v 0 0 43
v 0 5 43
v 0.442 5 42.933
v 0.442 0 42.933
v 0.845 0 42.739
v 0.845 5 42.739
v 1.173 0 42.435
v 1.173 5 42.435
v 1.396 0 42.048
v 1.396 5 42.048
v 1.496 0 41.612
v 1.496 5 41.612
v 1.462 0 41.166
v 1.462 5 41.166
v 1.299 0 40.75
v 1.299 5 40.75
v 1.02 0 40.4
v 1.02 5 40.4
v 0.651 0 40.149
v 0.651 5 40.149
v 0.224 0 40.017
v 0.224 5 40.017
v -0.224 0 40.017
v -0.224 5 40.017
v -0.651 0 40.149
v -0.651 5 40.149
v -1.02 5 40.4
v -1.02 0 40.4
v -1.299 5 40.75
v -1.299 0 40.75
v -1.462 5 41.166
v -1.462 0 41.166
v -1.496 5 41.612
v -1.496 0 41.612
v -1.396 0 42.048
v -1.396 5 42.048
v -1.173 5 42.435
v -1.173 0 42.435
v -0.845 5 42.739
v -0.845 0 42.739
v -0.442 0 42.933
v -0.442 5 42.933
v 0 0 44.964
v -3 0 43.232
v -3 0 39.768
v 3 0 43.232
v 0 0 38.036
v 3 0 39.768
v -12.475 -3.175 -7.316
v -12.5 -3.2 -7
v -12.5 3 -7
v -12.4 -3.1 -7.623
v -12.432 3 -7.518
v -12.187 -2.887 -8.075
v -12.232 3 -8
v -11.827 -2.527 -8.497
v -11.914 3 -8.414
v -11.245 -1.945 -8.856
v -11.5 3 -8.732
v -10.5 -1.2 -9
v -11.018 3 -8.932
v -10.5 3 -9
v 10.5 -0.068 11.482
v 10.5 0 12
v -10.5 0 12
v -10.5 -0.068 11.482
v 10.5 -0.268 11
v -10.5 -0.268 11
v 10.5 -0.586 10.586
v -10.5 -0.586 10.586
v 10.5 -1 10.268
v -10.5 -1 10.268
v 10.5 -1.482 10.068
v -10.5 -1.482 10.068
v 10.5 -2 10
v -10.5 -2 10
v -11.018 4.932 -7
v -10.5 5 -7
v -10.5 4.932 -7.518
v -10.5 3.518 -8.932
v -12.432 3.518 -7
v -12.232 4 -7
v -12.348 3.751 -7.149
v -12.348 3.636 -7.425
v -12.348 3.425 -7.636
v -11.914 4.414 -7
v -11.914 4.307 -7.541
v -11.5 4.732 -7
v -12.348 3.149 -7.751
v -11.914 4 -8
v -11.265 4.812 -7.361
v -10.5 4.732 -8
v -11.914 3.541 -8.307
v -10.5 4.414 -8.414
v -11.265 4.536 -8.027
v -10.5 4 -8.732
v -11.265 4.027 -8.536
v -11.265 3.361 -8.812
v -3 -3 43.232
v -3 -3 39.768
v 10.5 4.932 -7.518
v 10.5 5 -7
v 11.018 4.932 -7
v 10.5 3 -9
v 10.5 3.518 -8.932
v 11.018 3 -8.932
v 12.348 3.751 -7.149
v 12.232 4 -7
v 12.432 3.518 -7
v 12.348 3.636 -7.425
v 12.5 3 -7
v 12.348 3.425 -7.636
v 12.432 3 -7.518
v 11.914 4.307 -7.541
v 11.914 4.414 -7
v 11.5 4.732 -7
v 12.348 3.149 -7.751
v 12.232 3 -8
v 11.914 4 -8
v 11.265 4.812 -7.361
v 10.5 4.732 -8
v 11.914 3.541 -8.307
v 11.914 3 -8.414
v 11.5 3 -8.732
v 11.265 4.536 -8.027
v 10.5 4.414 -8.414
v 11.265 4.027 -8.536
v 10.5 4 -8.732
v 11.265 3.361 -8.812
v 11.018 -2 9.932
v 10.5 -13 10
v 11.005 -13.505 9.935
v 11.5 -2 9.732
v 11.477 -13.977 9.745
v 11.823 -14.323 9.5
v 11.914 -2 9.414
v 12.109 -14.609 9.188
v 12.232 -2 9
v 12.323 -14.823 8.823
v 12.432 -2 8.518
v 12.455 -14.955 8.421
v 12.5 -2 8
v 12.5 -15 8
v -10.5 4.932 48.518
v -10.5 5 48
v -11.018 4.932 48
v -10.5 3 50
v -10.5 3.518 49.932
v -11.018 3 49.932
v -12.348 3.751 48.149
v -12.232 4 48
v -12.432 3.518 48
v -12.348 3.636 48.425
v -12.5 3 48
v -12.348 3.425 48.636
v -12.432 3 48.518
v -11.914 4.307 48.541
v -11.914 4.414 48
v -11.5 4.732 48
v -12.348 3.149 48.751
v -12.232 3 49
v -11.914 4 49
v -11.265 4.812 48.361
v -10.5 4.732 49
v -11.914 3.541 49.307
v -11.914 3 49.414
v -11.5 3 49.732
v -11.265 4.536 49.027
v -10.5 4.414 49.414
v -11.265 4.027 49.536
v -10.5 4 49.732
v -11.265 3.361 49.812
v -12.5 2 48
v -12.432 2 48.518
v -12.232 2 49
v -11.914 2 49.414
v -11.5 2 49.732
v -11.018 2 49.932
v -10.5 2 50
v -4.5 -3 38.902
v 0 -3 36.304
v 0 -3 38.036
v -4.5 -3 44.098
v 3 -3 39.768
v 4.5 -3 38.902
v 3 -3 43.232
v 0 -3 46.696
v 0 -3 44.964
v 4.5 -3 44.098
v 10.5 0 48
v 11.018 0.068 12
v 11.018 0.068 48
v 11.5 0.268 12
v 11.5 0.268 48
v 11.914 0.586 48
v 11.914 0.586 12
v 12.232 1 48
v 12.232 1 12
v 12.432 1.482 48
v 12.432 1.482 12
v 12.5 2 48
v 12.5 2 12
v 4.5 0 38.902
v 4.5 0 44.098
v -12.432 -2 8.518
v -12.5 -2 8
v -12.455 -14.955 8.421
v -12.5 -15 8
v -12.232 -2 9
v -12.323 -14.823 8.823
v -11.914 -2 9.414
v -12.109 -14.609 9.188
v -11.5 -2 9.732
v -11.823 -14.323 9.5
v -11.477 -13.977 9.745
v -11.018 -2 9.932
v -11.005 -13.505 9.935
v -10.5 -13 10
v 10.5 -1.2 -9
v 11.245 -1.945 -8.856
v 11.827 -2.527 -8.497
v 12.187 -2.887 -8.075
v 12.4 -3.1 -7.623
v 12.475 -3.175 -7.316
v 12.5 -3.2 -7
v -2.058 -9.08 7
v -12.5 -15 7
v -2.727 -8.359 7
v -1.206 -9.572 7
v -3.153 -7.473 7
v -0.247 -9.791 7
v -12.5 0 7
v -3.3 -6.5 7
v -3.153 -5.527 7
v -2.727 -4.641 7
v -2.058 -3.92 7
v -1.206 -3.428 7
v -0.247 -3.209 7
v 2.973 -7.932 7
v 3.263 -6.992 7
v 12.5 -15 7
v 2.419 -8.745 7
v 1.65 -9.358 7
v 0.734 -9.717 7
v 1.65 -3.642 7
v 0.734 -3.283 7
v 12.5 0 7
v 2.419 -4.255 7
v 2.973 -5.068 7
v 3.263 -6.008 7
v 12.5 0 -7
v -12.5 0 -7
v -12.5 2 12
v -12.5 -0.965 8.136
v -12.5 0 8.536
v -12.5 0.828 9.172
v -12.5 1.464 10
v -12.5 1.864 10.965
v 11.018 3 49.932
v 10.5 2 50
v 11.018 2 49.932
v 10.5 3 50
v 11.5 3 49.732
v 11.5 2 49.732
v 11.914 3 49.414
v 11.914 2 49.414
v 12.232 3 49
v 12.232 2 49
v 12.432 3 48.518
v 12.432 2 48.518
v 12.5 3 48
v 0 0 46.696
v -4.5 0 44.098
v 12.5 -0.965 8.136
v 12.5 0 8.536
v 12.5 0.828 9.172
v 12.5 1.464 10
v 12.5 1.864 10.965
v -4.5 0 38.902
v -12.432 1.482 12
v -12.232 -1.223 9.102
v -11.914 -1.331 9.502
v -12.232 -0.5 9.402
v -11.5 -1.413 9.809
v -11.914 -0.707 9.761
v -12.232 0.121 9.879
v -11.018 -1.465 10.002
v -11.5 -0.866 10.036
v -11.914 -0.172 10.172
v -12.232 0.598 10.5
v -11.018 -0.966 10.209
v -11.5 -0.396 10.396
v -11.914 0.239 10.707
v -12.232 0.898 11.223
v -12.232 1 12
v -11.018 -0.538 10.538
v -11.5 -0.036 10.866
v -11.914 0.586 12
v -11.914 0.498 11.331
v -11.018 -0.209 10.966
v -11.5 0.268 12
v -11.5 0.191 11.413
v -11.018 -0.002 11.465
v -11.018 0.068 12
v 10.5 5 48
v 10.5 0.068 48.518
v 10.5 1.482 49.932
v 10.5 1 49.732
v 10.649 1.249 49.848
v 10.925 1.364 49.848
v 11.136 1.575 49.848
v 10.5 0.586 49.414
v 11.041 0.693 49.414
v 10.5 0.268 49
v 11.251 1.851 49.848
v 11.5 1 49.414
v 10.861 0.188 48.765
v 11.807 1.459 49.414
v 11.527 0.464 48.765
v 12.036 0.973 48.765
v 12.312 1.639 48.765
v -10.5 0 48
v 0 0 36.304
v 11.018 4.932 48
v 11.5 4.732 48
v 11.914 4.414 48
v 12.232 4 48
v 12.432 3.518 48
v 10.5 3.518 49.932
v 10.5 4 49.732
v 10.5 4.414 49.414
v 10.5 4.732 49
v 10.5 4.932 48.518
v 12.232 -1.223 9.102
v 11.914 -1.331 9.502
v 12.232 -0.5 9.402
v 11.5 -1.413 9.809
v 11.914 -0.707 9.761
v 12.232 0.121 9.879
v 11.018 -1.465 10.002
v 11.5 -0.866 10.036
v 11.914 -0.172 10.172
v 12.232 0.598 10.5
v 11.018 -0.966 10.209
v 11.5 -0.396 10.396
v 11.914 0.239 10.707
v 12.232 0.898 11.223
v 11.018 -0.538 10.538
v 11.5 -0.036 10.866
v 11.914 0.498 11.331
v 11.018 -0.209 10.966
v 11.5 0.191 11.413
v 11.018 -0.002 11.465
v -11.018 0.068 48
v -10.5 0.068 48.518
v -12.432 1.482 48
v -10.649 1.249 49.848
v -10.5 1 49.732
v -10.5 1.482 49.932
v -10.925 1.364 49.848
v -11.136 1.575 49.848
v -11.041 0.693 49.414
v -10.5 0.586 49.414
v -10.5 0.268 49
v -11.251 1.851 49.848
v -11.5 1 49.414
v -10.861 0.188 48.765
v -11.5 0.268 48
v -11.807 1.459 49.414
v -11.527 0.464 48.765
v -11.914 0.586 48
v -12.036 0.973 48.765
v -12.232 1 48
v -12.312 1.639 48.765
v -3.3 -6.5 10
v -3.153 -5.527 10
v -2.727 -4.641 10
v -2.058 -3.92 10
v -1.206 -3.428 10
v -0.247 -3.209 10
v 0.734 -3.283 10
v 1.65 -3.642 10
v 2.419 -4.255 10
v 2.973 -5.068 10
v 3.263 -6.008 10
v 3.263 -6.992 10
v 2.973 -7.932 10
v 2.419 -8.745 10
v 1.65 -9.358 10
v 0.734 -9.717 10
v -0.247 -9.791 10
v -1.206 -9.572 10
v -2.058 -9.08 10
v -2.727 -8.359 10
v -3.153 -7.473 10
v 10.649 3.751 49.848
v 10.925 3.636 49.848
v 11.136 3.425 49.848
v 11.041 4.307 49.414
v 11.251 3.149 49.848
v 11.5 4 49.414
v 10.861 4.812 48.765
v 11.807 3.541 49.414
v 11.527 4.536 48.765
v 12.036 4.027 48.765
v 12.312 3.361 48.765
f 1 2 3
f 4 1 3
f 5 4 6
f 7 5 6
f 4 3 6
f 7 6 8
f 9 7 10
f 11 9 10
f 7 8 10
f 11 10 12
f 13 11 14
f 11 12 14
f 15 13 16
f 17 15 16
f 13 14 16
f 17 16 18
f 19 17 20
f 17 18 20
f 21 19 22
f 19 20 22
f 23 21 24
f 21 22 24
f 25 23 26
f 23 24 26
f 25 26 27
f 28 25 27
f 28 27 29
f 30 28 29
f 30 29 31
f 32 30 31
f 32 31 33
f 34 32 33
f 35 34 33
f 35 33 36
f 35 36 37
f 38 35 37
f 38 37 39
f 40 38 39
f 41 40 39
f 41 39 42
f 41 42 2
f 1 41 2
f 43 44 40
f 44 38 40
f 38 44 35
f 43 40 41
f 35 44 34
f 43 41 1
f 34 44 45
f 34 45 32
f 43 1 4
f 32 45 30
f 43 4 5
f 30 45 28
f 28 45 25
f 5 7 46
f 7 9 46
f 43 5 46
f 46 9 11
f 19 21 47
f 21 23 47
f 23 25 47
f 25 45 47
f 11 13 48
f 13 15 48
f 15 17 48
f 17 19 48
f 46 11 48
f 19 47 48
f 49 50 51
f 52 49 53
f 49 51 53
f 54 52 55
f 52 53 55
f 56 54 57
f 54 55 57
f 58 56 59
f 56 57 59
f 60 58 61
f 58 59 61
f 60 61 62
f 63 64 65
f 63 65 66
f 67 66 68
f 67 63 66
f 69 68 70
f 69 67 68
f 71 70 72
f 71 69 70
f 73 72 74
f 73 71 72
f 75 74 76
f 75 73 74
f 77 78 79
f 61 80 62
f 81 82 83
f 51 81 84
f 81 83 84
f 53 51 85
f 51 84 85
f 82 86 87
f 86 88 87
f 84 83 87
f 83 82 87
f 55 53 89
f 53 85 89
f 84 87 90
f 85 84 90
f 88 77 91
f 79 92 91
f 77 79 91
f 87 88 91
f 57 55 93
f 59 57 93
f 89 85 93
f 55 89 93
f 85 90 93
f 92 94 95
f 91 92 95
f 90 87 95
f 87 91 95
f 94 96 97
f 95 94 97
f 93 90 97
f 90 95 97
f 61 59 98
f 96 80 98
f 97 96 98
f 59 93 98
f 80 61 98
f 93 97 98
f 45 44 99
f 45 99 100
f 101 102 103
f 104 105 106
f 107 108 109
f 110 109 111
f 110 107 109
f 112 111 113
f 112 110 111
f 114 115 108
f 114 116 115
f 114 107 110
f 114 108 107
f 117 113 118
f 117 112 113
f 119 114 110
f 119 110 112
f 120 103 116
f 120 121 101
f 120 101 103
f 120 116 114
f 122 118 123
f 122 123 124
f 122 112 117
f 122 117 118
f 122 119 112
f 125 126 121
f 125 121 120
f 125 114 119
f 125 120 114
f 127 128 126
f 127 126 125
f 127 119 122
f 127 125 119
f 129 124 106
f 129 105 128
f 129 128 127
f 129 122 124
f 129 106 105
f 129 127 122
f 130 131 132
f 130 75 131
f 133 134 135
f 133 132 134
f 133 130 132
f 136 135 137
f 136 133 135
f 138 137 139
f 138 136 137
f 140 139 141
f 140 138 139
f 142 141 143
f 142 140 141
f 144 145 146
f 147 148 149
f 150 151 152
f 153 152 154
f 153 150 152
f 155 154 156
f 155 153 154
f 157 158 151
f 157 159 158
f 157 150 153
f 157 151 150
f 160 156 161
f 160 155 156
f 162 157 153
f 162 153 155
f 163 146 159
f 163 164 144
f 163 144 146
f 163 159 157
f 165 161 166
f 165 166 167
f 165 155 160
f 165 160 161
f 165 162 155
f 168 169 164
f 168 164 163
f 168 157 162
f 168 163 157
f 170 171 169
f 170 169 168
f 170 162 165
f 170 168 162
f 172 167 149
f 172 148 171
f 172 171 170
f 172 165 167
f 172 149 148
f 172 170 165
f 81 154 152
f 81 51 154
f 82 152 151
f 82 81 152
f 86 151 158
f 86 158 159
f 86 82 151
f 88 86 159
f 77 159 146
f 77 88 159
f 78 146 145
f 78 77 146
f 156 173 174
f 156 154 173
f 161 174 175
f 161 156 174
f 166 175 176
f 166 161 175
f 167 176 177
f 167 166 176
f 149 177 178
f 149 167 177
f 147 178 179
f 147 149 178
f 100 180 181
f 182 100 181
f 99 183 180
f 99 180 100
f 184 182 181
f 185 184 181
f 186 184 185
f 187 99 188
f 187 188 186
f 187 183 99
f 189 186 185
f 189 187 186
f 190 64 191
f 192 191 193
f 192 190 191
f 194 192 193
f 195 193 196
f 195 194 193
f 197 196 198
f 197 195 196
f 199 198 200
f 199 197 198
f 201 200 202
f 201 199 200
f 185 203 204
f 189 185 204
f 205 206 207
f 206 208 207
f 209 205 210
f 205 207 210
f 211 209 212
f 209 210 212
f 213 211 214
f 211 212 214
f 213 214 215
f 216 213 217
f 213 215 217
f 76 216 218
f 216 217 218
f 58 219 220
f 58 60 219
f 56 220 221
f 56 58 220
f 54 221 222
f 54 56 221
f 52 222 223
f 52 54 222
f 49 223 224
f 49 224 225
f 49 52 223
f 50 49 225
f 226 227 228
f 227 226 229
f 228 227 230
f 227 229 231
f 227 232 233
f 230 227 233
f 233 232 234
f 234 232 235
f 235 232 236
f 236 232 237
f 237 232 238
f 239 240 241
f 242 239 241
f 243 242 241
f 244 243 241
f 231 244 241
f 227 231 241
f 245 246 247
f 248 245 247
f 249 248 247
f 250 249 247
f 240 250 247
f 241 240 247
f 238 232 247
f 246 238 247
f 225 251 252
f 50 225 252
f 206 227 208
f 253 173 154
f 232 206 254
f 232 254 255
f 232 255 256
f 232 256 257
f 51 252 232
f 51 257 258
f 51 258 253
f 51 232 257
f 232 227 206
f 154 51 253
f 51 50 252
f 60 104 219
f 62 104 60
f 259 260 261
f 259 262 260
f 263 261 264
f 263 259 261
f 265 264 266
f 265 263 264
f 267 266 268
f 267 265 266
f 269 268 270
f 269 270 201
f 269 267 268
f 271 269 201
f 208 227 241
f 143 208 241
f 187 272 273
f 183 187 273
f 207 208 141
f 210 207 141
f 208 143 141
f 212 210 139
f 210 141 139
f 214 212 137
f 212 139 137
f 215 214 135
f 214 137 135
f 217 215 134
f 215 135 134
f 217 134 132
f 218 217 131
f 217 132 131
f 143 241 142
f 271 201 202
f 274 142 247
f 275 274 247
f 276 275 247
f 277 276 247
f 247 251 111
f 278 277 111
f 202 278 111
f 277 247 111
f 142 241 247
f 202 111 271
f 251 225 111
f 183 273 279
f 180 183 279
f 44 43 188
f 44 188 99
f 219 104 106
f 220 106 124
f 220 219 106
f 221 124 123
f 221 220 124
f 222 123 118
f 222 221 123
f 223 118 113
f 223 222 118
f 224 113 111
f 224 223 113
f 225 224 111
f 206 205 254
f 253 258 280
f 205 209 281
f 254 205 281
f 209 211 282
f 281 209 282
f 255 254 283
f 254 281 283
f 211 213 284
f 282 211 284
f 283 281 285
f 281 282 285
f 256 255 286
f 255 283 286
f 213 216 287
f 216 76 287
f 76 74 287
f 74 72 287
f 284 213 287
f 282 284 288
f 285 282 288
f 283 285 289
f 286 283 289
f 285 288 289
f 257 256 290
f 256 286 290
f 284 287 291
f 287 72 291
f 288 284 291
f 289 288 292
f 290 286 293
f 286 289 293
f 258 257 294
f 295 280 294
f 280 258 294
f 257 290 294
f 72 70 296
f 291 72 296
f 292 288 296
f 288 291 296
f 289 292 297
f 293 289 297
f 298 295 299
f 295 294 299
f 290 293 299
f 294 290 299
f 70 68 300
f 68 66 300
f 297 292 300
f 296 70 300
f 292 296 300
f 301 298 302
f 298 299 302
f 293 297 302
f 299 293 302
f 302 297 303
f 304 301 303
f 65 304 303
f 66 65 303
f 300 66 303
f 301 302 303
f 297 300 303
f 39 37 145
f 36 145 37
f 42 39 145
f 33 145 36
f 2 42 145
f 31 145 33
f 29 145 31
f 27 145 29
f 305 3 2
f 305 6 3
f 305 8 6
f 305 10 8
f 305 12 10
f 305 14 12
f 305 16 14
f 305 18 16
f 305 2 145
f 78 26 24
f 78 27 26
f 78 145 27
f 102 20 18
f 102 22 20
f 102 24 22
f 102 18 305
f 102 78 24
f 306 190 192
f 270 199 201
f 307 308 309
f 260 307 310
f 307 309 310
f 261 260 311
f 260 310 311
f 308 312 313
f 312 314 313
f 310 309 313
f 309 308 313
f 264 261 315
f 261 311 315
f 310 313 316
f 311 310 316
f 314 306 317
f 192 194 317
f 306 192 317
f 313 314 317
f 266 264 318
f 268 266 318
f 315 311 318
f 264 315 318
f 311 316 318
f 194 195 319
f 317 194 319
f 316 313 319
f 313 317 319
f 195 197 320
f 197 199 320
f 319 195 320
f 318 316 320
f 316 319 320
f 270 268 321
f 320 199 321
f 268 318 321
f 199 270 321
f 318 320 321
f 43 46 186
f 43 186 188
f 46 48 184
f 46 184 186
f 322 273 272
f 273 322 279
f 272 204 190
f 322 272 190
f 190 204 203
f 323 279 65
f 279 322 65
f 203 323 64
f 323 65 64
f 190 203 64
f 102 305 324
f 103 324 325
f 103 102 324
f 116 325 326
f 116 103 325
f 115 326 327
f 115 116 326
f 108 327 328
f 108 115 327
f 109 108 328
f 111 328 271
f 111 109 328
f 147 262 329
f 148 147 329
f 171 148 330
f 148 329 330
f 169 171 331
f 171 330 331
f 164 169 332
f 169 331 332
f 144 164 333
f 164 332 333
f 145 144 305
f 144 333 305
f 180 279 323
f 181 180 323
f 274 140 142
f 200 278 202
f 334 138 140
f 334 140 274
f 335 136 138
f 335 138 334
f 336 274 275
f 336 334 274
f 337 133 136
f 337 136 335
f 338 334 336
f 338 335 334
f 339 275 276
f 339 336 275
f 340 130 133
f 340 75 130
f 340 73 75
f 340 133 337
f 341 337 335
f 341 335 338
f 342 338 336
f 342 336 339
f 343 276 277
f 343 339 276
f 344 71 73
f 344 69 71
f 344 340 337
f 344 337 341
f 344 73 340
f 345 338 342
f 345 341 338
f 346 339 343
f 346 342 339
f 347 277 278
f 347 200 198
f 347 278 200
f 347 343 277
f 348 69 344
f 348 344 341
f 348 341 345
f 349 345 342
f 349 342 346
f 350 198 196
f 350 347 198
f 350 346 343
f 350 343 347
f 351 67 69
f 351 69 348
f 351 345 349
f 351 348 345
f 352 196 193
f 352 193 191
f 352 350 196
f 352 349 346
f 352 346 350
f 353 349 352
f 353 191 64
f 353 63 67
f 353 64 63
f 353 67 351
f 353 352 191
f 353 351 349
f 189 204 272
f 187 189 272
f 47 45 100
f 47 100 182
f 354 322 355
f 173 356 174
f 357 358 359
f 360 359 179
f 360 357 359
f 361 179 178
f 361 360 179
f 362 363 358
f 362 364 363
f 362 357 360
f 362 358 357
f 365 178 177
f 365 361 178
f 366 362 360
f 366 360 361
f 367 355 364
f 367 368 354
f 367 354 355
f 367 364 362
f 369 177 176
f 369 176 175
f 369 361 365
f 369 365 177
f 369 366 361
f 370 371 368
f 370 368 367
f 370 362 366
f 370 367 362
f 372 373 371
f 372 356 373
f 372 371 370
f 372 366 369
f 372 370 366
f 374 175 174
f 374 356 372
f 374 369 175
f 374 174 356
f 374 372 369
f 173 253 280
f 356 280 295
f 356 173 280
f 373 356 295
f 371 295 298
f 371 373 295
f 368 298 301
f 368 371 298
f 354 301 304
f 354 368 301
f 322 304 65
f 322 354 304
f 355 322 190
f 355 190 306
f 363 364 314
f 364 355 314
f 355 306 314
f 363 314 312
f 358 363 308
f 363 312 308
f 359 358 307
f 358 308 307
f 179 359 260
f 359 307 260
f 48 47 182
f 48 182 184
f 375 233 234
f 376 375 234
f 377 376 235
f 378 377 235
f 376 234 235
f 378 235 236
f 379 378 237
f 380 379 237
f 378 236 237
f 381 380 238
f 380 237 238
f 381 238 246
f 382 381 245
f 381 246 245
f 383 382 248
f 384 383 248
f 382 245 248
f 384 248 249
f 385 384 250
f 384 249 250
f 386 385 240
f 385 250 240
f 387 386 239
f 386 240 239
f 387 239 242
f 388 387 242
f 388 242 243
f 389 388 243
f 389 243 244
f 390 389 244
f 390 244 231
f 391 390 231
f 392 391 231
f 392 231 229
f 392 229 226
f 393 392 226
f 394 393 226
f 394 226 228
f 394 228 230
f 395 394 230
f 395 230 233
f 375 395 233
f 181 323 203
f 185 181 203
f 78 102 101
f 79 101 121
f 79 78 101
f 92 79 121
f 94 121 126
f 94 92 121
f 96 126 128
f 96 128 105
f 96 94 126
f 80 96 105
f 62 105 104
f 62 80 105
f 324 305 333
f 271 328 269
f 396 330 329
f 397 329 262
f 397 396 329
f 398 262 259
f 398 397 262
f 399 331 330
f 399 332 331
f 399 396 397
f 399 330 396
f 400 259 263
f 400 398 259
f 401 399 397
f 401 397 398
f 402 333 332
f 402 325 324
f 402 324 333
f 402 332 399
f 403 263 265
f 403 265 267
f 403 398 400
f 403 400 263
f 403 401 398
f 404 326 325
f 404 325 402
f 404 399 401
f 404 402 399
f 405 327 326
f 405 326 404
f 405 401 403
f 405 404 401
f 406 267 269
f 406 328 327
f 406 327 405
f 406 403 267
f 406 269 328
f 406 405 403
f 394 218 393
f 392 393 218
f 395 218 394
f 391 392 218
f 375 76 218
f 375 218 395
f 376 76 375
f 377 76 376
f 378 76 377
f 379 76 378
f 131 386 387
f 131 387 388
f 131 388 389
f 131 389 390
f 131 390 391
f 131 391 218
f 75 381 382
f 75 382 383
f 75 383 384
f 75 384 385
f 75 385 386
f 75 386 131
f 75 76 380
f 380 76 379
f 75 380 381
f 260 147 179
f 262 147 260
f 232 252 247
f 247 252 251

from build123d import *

# Parameters (mm, degrees)
SKETCH1_W            = 25
SKETCH1_H            = 14
BOSS_EXTRUDE1_DEPTH  = 5
SKETCH2_W            = 25
SKETCH2_H            = 5
SKETCH2_H_2          = 15
BOSS_EXTRUDE2_DEPTH  = 3
M6_CLEARANCE_HOLE1_D = 6.6
SKETCH10_W           = 25
SKETCH10_H           = 5
BOSS_EXTRUDE5_DEPTH  = 2
SKETCH5_W            = 25
SKETCH5_H            = 5
BOSS_EXTRUDE4_DEPTH  = 40
CUT_EXTRUDE1_REACH   = 57.283
SKETCH9_R            = 1.5
FILLET1_R            = 2
BOSS_EXTRUDE6_DEPTH  = 3


with BuildPart() as part:
    # Sketch1 → Boss-Extrude1 (new body)
    with BuildSketch(Plane(origin=(0, 0, 0), x_dir=(1, 0, 0), z_dir=(0, 1, 0))):
        Rectangle(SKETCH1_W, SKETCH1_H)
    extrude(amount=BOSS_EXTRUDE1_DEPTH)

    # Sketch2 → Boss-Extrude2 (add)
    with BuildSketch(Plane.XY.offset(7)):
        with Locations((0, 2.5)):
            Rectangle(SKETCH2_W, SKETCH2_H)
        with Locations((0, -7.5)):
            Rectangle(SKETCH2_W, SKETCH2_H_2)
    extrude(amount=BOSS_EXTRUDE2_DEPTH)

    # M6 Clearance Hole1 (through all)
    with Locations(Plane.XY.offset(10)):
        with Locations((0, -6.5)):
            Hole(M6_CLEARANCE_HOLE1_D / 2)

    # Sketch10 → Boss-Extrude5 (add)
    with BuildSketch(Plane(origin=(0, 0, -7), x_dir=(-1, 0, 0), z_dir=(0, 0, -1))):
        Polygon((-12.5, 0), (-12.5, -3.2), (1e-09, -3.2), (12.5, -3.2), (12.5, 0), align=None)
        with Locations((0, 2.5)):
            Rectangle(SKETCH10_W, SKETCH10_H)
    extrude(amount=BOSS_EXTRUDE5_DEPTH)

    # Sketch5 → Boss-Extrude4 (add)
    with BuildSketch(Plane.XY.offset(10)):
        with Locations((0, 2.5)):
            Rectangle(SKETCH5_W, SKETCH5_H)
    extrude(amount=BOSS_EXTRUDE4_DEPTH)

    # Sketch9 → Cut-Extrude1 (cut, up to next)
    with BuildSketch(Plane(origin=(0, 5, 0), x_dir=(1, 0, 0), z_dir=(0, 1, 0)), mode=Mode.PRIVATE) as cut_extrude1_sk1:
        with Locations(Location((0, -41.5, 0), (0, 0, 270))):
            Circle(SKETCH9_R)
    cut_extrude1_tool1 = extrude(cut_extrude1_sk1.sketch, amount=-CUT_EXTRUDE1_REACH, mode=Mode.PRIVATE) & part.part
    add(cut_extrude1_tool1.solids().sort_by_distance((0, 5, 41.5))[0], mode=Mode.SUBTRACT)

    # Fillet1
    fillet1_edges = [part.edges().sort_by_distance(p)[0] for p in [
        (12.5, 0, 30),
        (-12.5, 0, 30),
        (0, -15, 10),
        (0, -3.2, -9),
        (0, 5, -9),
        (12.5, 5, 20.5),
        (0, 0, 50),
        (0, 5, 50),
        (-12.5, 5, 20.5),
        (0, 0, 10),
        (12.5, -7.5, 10),
        (-12.5, -7.5, 10),
        (-12.5, 0.9, -9),
        (12.5, 0.9, -9),
        (-12.5, 2.5, 50),
        (12.5, 2.5, 50),
    ]]
    fillet(fillet1_edges, radius=FILLET1_R - 0.0001)  # a hair under: the kernel refuses the full size

    # Sketch11 → Boss-Extrude6 (add)
    with BuildSketch(Plane.XZ):
        Polygon((4.5, 38.901923789), (4.5, 44.098076211), (0, 46.696152423), (-4.5, 44.098076211), (-4.5, 38.901923789), (0, 36.303847577), align=None)
        Polygon((0, 44.964101615), (-3, 43.232050808), (-3, 39.767949192), (0, 38.035898385), (3, 39.767949192), (3, 43.232050808), align=None, mode=Mode.SUBTRACT)
    extrude(amount=BOSS_EXTRUDE6_DEPTH)


solid = part.part
